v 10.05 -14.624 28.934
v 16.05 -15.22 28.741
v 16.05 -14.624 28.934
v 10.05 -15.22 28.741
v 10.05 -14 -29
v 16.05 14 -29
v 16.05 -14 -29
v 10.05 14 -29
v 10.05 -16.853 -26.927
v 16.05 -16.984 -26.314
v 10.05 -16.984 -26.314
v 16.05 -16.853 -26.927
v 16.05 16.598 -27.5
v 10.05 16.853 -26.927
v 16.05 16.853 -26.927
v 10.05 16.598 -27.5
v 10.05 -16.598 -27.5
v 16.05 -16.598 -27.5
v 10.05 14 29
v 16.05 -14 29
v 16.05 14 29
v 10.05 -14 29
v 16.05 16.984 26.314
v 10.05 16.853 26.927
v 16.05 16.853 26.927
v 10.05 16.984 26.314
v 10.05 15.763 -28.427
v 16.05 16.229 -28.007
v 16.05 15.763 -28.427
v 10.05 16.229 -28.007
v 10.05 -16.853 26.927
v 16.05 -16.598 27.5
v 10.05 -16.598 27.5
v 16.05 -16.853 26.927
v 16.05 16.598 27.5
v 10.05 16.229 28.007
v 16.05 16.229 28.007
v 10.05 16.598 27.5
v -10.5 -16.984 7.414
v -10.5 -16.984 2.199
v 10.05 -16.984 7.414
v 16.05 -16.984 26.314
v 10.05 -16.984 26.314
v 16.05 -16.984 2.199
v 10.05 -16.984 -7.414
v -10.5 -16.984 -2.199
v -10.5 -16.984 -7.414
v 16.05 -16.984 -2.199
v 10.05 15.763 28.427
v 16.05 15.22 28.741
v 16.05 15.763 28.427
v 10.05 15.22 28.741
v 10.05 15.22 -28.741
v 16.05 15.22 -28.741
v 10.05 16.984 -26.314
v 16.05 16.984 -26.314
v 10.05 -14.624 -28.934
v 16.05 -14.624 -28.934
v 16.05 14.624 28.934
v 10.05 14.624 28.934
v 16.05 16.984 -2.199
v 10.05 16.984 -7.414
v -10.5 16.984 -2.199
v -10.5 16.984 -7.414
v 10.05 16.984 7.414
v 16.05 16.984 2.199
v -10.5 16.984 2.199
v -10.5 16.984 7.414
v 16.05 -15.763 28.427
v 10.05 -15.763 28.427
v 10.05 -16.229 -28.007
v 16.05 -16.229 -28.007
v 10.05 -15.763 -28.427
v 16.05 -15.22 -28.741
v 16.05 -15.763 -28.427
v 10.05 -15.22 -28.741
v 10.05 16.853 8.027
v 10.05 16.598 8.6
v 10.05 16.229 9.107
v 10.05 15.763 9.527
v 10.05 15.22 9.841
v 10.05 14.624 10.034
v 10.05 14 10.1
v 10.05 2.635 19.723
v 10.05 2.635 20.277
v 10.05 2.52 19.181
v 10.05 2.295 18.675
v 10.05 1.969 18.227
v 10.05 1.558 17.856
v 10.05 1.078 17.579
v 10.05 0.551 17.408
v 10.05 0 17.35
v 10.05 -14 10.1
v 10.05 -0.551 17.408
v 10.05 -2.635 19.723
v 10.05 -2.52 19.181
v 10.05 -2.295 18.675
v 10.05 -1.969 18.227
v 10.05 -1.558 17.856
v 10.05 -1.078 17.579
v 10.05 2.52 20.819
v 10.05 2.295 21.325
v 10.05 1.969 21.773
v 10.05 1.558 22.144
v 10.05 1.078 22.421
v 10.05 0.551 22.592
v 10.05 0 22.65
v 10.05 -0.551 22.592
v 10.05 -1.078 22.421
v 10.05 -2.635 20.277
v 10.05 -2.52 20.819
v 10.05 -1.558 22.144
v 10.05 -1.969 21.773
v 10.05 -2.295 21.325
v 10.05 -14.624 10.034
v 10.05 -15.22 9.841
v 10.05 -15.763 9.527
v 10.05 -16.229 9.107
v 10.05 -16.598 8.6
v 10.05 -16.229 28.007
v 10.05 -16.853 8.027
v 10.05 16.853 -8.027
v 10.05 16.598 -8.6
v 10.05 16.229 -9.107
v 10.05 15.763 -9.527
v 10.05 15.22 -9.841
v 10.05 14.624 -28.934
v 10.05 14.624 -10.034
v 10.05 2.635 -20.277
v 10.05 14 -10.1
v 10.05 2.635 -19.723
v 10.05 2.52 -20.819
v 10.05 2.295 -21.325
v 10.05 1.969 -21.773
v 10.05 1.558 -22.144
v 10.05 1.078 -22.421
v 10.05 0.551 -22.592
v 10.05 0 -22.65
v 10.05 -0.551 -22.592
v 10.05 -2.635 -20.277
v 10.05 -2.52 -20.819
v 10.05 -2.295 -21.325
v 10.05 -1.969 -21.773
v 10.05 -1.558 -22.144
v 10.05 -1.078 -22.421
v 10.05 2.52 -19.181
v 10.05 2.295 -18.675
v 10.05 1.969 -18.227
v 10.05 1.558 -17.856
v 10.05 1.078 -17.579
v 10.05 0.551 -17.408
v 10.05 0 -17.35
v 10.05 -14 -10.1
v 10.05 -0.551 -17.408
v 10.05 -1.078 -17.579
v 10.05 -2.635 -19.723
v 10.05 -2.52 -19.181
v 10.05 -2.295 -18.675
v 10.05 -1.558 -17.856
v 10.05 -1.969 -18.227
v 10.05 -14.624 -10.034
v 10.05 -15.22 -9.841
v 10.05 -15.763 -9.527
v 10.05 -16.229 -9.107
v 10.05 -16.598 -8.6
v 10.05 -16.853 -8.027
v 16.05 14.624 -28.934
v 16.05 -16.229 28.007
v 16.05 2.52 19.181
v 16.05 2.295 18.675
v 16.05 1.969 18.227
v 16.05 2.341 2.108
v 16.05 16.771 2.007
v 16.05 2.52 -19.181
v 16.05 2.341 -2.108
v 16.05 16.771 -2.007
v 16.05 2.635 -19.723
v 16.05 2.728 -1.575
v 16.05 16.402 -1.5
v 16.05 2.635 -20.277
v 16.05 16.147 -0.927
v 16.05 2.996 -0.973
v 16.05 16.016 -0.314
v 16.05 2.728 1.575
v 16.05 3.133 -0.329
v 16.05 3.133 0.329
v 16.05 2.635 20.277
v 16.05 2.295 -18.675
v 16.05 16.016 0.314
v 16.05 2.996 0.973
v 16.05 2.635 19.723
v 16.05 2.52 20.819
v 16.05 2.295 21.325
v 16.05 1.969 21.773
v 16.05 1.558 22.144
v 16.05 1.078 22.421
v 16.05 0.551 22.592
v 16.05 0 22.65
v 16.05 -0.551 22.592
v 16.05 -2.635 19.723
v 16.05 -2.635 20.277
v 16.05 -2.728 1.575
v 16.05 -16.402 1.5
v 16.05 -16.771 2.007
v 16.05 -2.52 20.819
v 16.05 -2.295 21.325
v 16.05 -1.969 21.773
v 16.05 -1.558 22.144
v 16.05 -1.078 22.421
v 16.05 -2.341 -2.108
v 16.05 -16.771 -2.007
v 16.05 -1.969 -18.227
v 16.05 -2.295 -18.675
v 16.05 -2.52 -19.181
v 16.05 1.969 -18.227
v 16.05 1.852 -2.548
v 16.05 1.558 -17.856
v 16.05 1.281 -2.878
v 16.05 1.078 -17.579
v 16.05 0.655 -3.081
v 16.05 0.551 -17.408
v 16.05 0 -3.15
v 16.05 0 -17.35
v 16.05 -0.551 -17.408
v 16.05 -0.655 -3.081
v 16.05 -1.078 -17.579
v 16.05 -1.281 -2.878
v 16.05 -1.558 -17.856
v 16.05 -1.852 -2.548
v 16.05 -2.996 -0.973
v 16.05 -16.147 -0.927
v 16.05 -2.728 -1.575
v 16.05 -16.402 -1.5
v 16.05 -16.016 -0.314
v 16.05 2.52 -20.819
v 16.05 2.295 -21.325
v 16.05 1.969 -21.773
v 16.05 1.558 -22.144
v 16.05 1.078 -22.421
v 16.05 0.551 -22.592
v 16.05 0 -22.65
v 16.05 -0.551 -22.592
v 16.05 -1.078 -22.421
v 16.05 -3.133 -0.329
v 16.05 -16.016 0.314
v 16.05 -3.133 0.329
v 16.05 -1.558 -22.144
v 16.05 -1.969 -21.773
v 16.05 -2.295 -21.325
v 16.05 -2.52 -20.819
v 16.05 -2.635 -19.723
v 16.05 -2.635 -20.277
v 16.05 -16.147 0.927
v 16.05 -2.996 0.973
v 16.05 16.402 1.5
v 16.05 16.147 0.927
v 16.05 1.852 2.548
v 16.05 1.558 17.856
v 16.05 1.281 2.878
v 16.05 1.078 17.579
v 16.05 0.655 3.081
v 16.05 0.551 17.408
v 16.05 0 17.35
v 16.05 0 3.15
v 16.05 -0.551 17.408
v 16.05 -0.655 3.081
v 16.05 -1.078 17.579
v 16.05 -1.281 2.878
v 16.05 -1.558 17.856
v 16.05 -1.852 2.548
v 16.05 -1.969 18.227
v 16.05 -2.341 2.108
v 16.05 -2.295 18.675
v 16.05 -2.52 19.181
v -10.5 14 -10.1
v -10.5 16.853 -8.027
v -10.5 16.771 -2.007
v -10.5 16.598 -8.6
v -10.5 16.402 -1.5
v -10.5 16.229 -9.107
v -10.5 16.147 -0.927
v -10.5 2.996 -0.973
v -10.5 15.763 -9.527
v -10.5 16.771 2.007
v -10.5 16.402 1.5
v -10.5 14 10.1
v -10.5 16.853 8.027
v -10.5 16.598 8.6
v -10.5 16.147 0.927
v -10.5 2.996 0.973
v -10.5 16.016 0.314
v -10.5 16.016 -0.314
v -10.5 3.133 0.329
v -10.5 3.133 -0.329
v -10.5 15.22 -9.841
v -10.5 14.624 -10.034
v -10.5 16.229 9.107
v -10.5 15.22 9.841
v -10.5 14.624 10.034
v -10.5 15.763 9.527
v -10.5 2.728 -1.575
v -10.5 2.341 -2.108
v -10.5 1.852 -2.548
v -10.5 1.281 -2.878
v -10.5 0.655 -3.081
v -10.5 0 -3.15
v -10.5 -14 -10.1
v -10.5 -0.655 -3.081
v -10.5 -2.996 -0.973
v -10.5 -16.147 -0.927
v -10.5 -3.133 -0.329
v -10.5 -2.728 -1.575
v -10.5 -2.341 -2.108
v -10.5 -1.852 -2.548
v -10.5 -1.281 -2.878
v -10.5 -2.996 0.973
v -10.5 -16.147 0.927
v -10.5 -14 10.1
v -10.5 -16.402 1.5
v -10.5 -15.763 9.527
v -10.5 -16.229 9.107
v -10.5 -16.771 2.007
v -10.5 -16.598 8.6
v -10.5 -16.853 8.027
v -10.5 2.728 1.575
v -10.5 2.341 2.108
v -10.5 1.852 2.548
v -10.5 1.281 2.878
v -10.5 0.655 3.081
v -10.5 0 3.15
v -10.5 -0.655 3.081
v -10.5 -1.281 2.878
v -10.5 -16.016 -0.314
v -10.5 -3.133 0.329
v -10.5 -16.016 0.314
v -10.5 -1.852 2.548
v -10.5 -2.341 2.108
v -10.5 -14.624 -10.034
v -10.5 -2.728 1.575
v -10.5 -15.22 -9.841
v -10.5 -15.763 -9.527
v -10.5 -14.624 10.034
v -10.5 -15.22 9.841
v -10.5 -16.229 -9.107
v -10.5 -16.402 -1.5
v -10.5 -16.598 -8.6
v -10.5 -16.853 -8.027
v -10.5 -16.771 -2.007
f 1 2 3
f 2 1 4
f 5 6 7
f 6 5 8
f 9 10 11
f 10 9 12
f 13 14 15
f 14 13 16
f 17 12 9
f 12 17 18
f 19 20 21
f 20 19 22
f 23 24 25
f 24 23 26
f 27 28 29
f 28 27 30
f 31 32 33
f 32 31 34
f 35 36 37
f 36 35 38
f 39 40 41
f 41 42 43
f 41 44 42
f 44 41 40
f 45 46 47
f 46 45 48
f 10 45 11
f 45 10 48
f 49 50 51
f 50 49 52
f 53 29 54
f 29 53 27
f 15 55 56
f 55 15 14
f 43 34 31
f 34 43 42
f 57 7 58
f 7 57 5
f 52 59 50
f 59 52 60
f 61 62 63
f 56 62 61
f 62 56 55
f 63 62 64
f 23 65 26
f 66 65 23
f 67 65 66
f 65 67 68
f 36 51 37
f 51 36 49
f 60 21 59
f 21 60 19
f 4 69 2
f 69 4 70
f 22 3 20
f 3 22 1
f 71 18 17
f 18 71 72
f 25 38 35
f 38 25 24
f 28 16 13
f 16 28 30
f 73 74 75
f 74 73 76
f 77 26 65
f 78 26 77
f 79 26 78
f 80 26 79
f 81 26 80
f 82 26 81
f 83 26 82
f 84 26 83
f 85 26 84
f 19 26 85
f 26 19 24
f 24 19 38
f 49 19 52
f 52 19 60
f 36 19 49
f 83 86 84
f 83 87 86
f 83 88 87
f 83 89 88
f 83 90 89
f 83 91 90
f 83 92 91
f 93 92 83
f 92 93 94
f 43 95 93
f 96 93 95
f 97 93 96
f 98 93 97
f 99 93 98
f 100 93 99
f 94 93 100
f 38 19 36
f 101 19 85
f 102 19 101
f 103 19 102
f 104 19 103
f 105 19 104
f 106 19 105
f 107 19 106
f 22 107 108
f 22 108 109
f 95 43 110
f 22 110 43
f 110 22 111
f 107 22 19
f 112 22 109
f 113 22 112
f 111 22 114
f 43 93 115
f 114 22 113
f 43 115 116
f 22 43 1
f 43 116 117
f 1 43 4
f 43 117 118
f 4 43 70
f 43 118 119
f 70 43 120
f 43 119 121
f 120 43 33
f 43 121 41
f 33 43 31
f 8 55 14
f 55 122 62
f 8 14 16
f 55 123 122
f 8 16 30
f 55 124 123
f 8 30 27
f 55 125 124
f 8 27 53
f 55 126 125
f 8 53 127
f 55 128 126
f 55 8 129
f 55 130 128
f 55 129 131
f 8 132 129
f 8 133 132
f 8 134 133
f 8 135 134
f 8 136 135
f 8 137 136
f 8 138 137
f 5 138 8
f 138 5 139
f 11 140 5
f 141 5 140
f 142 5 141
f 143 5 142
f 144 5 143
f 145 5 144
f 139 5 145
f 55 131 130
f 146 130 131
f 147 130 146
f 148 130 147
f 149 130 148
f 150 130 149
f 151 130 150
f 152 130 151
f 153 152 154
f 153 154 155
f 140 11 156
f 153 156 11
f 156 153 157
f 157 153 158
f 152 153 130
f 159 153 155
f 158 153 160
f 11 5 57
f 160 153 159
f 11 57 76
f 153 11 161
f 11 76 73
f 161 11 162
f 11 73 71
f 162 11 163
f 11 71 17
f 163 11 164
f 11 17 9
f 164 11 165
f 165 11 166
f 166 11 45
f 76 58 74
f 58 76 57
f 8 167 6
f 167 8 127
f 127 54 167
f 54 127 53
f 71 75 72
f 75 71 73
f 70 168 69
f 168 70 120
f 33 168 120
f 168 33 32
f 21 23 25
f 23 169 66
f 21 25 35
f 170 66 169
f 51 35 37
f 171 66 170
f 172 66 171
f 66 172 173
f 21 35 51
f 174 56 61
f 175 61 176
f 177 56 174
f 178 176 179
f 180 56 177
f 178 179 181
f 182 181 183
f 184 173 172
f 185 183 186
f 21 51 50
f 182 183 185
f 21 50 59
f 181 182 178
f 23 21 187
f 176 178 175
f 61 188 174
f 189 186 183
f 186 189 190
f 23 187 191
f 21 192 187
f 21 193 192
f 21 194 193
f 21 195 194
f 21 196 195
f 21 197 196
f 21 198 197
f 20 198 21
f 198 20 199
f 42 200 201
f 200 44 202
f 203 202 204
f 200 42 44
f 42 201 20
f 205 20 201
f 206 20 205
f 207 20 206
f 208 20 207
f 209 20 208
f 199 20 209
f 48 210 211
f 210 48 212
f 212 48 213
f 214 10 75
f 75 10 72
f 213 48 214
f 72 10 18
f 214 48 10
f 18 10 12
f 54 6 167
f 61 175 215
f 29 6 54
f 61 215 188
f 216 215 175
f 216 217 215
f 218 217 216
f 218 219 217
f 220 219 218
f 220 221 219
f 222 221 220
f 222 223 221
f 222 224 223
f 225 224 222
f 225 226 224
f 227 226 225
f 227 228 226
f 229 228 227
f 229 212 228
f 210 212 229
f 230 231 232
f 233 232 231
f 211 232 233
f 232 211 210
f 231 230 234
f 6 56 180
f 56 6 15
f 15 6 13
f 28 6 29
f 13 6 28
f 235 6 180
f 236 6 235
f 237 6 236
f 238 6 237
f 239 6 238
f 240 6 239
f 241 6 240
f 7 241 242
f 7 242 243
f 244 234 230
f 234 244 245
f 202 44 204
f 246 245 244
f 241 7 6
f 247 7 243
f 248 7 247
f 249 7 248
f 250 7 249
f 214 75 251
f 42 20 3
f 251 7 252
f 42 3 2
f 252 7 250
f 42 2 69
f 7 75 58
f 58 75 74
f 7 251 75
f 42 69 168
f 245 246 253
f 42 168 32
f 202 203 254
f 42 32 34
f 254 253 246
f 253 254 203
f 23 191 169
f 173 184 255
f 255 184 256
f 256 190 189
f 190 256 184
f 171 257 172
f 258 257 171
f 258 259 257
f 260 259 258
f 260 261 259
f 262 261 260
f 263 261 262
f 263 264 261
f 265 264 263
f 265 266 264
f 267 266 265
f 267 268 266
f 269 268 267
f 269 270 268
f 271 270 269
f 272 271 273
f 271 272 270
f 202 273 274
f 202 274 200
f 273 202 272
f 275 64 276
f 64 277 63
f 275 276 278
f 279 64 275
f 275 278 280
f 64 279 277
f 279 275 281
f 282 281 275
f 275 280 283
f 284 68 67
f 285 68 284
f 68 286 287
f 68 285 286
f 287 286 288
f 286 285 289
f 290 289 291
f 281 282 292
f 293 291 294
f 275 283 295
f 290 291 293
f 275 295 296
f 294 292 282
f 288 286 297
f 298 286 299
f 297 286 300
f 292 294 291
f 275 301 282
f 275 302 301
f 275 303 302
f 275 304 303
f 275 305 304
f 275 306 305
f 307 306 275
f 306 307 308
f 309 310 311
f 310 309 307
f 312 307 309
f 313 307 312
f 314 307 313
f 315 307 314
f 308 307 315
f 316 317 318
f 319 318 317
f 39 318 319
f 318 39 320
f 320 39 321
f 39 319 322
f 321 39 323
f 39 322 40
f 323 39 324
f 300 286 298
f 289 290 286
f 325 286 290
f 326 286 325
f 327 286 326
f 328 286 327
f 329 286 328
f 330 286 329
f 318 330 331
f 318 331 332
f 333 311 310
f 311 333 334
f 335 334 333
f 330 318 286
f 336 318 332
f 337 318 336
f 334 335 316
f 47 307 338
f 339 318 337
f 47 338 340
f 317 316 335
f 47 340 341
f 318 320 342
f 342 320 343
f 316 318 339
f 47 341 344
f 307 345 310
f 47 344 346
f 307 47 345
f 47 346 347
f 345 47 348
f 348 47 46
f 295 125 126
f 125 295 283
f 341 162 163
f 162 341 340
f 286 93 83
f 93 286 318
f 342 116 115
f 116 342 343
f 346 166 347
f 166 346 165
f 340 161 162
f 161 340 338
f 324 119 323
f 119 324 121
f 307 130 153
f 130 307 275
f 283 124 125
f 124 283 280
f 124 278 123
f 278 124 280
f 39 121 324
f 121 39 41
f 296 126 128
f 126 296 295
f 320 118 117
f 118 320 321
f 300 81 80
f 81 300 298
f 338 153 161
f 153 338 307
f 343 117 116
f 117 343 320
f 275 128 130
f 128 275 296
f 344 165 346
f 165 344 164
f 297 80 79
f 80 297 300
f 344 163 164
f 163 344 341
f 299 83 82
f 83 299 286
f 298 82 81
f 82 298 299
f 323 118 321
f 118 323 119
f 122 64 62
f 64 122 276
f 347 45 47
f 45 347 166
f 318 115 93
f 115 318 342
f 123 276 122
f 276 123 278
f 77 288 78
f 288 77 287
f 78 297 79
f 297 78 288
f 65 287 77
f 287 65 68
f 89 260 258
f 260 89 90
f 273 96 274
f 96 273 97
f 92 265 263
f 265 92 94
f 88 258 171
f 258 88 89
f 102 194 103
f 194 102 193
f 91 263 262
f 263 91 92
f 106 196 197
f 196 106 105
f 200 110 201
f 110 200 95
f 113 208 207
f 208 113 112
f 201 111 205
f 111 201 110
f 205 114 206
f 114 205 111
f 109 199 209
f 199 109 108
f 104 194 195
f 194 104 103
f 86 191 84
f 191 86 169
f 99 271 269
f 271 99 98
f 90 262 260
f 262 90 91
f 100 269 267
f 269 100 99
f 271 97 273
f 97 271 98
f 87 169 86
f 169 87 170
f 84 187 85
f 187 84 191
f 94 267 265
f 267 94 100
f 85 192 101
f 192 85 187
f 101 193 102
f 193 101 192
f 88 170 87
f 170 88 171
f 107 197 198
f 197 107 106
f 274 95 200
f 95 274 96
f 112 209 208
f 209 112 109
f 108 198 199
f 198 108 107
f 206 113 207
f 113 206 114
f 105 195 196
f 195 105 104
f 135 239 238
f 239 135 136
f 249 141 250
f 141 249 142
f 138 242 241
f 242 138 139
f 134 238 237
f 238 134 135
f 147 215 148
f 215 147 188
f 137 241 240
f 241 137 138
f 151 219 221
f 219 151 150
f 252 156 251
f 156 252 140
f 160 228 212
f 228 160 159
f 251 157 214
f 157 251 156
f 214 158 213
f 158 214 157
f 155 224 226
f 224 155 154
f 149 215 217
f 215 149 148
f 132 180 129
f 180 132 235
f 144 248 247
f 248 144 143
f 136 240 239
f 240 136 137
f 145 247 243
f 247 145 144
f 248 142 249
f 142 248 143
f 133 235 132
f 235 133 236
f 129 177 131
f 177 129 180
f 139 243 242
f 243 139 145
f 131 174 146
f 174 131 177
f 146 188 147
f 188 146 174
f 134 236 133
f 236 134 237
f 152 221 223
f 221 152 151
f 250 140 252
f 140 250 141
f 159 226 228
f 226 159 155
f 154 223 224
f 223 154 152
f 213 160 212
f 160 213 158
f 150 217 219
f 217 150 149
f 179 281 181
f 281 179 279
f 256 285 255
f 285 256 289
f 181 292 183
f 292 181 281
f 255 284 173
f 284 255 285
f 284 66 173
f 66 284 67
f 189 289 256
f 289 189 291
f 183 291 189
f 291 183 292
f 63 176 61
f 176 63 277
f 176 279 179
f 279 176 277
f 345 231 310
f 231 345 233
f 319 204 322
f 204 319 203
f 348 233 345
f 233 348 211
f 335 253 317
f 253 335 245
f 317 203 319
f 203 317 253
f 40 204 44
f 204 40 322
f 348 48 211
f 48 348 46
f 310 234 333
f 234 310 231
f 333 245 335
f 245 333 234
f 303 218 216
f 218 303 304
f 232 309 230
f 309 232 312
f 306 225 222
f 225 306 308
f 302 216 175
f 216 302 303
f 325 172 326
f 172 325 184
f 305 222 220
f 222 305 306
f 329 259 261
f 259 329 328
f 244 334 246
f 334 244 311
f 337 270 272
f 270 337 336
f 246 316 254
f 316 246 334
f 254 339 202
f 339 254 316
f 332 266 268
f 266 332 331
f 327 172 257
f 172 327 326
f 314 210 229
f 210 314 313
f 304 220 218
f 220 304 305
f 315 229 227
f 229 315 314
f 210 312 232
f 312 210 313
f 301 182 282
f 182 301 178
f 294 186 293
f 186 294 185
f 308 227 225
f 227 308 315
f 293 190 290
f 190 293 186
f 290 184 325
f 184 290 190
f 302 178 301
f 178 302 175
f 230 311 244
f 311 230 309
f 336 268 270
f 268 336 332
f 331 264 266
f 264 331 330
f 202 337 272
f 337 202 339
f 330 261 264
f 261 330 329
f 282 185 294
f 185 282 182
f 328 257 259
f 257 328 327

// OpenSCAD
$fn = 30;

//translate([0,0,25]) Vrail(20,20);
//translate([0,0,-25]) Vrail(20,20);

//FixedMount("S");
//FixedMount("B");
//FixedMountSpacer("S");
//FixedMountSpacer("B");
//FloatedMount("S");
//FloatedMount("B");
FloatedMountSpacer("S");
//FloatedMountSpacer("B");


module FixedMount(iType){
	mountWidth = 70;

	plateHeigth = 70;
	plateDepth = 6;

	spacerHeigth = 30;

	screwCount = 2;

	if(iType == "S"){
		MountSpacer(plateDepth,mountWidth,plateHeigth,spacerHeigth,screwCount);
	} else {
		MountPlate(plateDepth,mountWidth,plateHeigth,spacerHeigth,screwCount);
	}
}

module FixedMountSpacer(iType){
	mountWidth = 34;

	plateHeigth = 70;
	plateDepth = 6;

	spacerHeigth = 30;

	screwCount = 2;

	if(iType == "S"){
		difference(){
			MountSpacer(plateDepth,mountWidth,plateHeigth,spacerHeigth,screwCount);
			screw6mm();
		}
	} else {
		difference(){
			MountPlate(plateDepth,mountWidth,plateHeigth,spacerHeigth,screwCount);
			screw6mm();
		}
	}

}

module FloatedMount(iType){
	mountWidth = 70;

	plateHeigth = 60;
	plateDepth = 6;

	spacerHeigth = 20;

	screwCount = 1;
	if(iType == "S"){
		MountSpacer(plateDepth,mountWidth,plateHeigth,spacerHeigth,screwCount);
	} else {
		MountPlate(plateDepth,mountWidth,plateHeigth,spacerHeigth,screwCount);
	}
}

module FloatedMountSpacer(iType){
	mountWidth = 34;

	plateHeigth = 60;
	plateDepth = 6;

	spacerHeigth = 20;

	screwCount = 2;

	if(iType == "S"){
		difference(){
			MountSpacer(plateDepth,mountWidth,plateHeigth,spacerHeigth,screwCount);
			screw6mm();
		}
	} else {
		difference(){
			MountPlate(plateDepth,mountWidth,plateHeigth,spacerHeigth,screwCount);
			screw6mm();
		}
	}

}


module MountPlate(plateDepth,mountWidth,plateHeigth,spacerHeigth,screwCount){
	difference(){
		translate([13.05,0,0]) plate(plateDepth,mountWidth,plateHeigth);
		allHoles(spacerHeigth,screwCount);
		sideCuts(plateDepth,mountWidth,plateHeigth,spacerHeigth,screwCount);
	}
}

//module FloatedMountBack(plateDepth,mountWidth,plateHeigth,spacerHeigth,screwCount){
//	difference(){
//		translate([13.05,0,0]) plate(plateDepth,mountWidth,plateHeigth);
//		allHoles(spacerHeigth,screwCount);
//	}
//}

module MountSpacer(plateDepth,mountWidth,plateHeigth,spacerHeigth,screwCount){
	difference(){
		union(){
			translate([13.05,0,0]) plate(plateDepth,mountWidth,plateHeigth); // Back Plate
			translate([2,0,0]) color("Blue") plate(25,mountWidth,spacerHeigth+2.2); // Spacer
			//translate([2,0,0]) color("Blue",.5) cube([24,mountWidth,spacerHeigth],center=true); // Center Spacer
		}
		allHoles(spacerHeigth,screwCount);
		sideCuts(plateDepth,mountWidth,plateHeigth,spacerHeigth,screwCount);
//		translate([0, (mountWidth/2), 0]) rotate([0,90,0]) color("Green") cylinder(d=6,h=99,center=true);
//		translate([0, -(mountWidth/2), 0]) rotate([0,90,0]) color("Green") cylinder(d=6,h=99,center=true);

	}
}

module sideCuts(plateDepth,mountWidth,plateHeigth,spacerHeigth,screwCount){
	translate([0, (mountWidth/2)+2, 0]) rotate([0,90,0]) color("Green") cylinder(d=6,h=99,center=true);
	translate([0, -(mountWidth/2)-2, 0]) rotate([0,90,0]) color("Green") cylinder(d=6,h=99,center=true);
}
module allHoles(spacerHeigth,screwCount){
	if(screwCount==1){
		patteren6mmHoles2(46,13);
	} else {
		patteren6mmHoles4(46,13);
	}
	translate([0,0,(spacerHeigth/2)+10]) patteren5mmHoles();
	translate([0,0,-(spacerHeigth/2)-10]) patteren5mmHoles();
}

module plate(depth, width, heigth){
	hull(){
		translate([0,(width/2)-3, (heigth/2)-4]) rotate([0,90,0]) cylinder(d=6,h=depth,center=true);
		translate([0,(width/2)-3, -(heigth/2)+4]) rotate([0,90,0]) cylinder(d=6,h=depth,center=true);
		translate([0,-(width/2)+3, (heigth/2)-4]) rotate([0,90,0]) cylinder(d=6,h=depth,center=true);
		translate([0,-(width/2)+3, -(heigth/2)+4]) rotate([0,90,0]) cylinder(d=6,h=depth,center=true);
	}
}

module patteren5mmHoles(){
	screw5mm();
	translate([0,20,0]) screw5mm();
	translate([0,-20,0]) screw5mm();
}

module patteren6mmHoles4(width, heigth){
	translate([0,width/2,heigth/2]) screw6mm();
	translate([0,width/2,-heigth/2]) screw6mm();
	translate([0,-width/2,heigth/2]) screw6mm();
	translate([0,-width/2,-heigth/2]) screw6mm();
}
module patteren6mmHoles2(width, heigth){
	translate([0,width/2,0]) screw6mm();
	translate([0,-width/2,0]) screw6mm();
}
module Vrail(x,z){
	color("DarkGrey",.5) cube([x+.1,100,z+.1],center=true); // 20mm rail
	color("DarkGrey",.5) cube([x+13,101,1],center=true); // 20mm rail
}

module screw6mm(){
	color("Red") rotate([0,90,0]) cylinder(d=6.3,h=100,center=true);
}

module screw5mm(){
	color("Green") rotate([0,90,0]) cylinder(d=5.3,h=100,center=true);
}
